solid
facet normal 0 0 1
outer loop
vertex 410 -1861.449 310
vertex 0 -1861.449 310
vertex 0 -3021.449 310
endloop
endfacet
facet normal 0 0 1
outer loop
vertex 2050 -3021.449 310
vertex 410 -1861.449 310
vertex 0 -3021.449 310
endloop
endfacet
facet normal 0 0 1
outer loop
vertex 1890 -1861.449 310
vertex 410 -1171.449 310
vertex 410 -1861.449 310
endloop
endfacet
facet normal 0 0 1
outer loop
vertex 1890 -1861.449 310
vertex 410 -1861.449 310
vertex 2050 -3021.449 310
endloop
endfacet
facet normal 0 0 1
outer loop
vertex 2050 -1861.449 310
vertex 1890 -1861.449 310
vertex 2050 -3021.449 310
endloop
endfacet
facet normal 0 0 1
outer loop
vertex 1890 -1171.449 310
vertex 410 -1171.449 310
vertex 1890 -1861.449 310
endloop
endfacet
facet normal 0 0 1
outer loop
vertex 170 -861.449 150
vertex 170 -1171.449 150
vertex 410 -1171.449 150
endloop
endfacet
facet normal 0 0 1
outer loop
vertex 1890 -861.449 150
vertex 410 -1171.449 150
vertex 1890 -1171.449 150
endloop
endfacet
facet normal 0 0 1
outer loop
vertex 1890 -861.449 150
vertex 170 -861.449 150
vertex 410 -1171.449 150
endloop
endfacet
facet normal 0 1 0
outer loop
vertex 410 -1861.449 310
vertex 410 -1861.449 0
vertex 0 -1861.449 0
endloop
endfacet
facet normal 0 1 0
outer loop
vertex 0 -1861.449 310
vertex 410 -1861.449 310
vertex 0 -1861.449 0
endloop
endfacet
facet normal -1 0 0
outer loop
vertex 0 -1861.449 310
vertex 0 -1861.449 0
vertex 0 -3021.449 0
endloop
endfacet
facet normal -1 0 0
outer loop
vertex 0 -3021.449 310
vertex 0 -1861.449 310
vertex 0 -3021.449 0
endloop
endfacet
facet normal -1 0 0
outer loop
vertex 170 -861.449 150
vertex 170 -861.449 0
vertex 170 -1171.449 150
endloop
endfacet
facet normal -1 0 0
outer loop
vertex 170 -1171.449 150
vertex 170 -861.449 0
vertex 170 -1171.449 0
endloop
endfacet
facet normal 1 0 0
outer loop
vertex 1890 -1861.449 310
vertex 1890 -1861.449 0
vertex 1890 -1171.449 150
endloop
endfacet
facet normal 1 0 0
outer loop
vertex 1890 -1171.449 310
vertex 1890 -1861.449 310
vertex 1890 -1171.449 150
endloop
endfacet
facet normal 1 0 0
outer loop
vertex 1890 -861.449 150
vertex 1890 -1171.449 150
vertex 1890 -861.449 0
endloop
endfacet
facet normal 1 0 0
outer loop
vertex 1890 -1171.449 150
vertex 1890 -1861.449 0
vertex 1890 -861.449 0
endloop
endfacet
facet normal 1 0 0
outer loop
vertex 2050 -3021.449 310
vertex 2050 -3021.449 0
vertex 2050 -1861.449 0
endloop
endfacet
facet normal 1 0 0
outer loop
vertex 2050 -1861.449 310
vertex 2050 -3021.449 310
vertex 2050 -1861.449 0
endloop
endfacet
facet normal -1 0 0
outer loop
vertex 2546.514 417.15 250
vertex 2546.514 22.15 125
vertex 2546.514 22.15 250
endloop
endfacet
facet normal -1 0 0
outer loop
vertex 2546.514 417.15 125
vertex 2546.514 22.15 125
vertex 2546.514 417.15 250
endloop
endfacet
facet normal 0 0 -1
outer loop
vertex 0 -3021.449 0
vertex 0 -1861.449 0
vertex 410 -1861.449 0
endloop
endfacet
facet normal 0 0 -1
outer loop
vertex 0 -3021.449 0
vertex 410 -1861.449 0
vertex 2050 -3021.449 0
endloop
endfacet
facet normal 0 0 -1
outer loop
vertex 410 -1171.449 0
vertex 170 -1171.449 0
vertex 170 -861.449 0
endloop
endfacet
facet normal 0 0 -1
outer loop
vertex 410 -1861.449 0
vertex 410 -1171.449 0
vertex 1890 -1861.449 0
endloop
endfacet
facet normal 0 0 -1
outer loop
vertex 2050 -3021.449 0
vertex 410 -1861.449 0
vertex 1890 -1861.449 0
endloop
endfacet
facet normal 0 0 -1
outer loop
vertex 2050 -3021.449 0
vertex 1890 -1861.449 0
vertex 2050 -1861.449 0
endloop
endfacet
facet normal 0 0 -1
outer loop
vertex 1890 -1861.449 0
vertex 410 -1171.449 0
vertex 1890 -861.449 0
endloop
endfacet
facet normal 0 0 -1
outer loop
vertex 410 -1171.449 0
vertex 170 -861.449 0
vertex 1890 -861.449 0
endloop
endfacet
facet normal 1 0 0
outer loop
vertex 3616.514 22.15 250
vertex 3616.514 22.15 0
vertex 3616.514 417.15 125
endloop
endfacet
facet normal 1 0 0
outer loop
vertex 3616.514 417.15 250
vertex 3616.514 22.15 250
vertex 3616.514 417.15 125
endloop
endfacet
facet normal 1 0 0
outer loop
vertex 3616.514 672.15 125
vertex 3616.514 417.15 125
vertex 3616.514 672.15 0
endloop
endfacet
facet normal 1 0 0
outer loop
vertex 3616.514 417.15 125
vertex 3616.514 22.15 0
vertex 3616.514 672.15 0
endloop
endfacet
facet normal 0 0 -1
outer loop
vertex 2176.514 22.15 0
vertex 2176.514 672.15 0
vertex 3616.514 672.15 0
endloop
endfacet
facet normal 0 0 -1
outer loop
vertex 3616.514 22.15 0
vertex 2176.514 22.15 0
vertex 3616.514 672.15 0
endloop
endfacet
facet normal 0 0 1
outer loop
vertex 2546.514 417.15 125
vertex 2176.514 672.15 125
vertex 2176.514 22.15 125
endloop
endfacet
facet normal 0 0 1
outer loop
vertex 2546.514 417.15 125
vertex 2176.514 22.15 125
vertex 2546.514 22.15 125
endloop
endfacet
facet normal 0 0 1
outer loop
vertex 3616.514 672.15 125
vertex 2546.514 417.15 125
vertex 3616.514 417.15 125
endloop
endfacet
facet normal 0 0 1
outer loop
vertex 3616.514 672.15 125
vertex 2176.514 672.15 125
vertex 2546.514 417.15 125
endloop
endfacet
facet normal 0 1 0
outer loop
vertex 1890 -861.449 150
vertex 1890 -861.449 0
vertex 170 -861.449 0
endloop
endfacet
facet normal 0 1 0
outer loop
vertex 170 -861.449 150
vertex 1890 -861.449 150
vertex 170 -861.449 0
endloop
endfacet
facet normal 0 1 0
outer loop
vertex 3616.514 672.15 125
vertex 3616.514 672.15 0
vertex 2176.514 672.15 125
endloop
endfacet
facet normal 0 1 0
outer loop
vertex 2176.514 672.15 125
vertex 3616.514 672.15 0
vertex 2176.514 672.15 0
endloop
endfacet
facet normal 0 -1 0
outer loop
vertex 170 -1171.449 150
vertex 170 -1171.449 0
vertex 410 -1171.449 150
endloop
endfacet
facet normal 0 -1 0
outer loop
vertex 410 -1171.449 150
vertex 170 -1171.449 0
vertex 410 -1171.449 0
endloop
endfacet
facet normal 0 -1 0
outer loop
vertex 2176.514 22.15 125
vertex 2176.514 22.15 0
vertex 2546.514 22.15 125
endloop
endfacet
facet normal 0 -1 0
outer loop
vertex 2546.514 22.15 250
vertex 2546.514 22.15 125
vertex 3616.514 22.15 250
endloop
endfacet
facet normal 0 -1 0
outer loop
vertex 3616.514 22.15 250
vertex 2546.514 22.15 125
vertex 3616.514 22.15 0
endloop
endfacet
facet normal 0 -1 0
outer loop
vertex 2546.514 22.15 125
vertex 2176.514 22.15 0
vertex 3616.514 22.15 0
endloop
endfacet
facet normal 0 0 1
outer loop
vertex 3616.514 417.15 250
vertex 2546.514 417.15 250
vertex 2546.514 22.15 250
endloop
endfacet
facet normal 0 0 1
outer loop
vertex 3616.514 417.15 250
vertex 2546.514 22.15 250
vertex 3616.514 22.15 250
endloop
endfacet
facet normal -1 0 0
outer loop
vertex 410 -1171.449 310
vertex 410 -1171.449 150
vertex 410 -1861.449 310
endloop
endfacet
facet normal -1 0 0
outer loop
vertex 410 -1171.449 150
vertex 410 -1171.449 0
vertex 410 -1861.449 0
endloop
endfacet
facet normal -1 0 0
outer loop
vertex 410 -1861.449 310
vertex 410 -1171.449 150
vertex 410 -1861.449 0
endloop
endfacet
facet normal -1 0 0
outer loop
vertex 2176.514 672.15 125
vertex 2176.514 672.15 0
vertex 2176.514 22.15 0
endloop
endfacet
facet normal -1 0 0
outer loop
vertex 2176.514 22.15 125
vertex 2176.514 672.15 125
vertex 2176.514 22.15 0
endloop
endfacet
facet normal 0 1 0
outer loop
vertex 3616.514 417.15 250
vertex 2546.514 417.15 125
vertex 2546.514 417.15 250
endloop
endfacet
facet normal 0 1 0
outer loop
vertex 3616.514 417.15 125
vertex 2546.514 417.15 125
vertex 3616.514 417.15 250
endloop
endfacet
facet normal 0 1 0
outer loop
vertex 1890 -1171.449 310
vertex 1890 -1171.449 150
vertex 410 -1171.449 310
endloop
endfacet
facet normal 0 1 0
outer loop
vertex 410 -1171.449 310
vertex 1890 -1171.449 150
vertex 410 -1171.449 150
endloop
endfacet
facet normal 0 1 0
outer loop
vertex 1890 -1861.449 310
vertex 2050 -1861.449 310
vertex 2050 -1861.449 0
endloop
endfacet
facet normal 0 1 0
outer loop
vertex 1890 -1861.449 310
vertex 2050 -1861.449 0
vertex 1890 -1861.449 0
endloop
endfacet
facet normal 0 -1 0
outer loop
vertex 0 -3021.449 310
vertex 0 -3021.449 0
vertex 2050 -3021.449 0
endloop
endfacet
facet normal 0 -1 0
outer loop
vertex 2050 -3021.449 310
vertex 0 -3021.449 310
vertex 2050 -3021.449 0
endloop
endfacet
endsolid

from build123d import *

# Parameters (mm, degrees)
F1_W     = 1070
F1_H     = 395
F2_DEPTH = 250
F4_DEPTH = 125
F7_DEPTH = 310
F8_DEPTH = 150


with BuildPart() as f2:
    # F1 (on face) → F2 (new body)
    with BuildSketch(Plane.XY):
        with Locations((3081.51358, 219.649576)):
            Rectangle(F1_W, F1_H)
    extrude(amount=F2_DEPTH)

    # F3 (on face) → F4 (join)
    with BuildSketch(Plane.XY):
        Polygon((2176.51358, 672.149576), (2176.51358, 22.149576), (2546.51358, 22.149576), (2546.51358, 417.149576), (3616.51358, 417.149576), (3616.51358, 672.149576), align=None)
    extrude(amount=F4_DEPTH)


with BuildPart() as f7:
    # F5 (on face) → F7 (new body)
    with BuildSketch(Plane.XY):
        Polygon((2050, -1861.448851), (1890, -1861.448851), (1890, -1171.448851), (410, -1171.448851), (410, -1861.448851), (0, -1861.448851), (0, -3021.448851), (2050, -3021.448851), align=None)
    extrude(amount=F7_DEPTH)

    # F6 (on face) → F8 (join)
    with BuildSketch(Plane.XY):
        Polygon((1890, -1171.448851), (1890, -861.448851), (170, -861.448851), (170, -1171.448851), (410, -1171.448851), align=None)
    extrude(amount=F8_DEPTH)


solid = Compound([f2.part, f7.part])
